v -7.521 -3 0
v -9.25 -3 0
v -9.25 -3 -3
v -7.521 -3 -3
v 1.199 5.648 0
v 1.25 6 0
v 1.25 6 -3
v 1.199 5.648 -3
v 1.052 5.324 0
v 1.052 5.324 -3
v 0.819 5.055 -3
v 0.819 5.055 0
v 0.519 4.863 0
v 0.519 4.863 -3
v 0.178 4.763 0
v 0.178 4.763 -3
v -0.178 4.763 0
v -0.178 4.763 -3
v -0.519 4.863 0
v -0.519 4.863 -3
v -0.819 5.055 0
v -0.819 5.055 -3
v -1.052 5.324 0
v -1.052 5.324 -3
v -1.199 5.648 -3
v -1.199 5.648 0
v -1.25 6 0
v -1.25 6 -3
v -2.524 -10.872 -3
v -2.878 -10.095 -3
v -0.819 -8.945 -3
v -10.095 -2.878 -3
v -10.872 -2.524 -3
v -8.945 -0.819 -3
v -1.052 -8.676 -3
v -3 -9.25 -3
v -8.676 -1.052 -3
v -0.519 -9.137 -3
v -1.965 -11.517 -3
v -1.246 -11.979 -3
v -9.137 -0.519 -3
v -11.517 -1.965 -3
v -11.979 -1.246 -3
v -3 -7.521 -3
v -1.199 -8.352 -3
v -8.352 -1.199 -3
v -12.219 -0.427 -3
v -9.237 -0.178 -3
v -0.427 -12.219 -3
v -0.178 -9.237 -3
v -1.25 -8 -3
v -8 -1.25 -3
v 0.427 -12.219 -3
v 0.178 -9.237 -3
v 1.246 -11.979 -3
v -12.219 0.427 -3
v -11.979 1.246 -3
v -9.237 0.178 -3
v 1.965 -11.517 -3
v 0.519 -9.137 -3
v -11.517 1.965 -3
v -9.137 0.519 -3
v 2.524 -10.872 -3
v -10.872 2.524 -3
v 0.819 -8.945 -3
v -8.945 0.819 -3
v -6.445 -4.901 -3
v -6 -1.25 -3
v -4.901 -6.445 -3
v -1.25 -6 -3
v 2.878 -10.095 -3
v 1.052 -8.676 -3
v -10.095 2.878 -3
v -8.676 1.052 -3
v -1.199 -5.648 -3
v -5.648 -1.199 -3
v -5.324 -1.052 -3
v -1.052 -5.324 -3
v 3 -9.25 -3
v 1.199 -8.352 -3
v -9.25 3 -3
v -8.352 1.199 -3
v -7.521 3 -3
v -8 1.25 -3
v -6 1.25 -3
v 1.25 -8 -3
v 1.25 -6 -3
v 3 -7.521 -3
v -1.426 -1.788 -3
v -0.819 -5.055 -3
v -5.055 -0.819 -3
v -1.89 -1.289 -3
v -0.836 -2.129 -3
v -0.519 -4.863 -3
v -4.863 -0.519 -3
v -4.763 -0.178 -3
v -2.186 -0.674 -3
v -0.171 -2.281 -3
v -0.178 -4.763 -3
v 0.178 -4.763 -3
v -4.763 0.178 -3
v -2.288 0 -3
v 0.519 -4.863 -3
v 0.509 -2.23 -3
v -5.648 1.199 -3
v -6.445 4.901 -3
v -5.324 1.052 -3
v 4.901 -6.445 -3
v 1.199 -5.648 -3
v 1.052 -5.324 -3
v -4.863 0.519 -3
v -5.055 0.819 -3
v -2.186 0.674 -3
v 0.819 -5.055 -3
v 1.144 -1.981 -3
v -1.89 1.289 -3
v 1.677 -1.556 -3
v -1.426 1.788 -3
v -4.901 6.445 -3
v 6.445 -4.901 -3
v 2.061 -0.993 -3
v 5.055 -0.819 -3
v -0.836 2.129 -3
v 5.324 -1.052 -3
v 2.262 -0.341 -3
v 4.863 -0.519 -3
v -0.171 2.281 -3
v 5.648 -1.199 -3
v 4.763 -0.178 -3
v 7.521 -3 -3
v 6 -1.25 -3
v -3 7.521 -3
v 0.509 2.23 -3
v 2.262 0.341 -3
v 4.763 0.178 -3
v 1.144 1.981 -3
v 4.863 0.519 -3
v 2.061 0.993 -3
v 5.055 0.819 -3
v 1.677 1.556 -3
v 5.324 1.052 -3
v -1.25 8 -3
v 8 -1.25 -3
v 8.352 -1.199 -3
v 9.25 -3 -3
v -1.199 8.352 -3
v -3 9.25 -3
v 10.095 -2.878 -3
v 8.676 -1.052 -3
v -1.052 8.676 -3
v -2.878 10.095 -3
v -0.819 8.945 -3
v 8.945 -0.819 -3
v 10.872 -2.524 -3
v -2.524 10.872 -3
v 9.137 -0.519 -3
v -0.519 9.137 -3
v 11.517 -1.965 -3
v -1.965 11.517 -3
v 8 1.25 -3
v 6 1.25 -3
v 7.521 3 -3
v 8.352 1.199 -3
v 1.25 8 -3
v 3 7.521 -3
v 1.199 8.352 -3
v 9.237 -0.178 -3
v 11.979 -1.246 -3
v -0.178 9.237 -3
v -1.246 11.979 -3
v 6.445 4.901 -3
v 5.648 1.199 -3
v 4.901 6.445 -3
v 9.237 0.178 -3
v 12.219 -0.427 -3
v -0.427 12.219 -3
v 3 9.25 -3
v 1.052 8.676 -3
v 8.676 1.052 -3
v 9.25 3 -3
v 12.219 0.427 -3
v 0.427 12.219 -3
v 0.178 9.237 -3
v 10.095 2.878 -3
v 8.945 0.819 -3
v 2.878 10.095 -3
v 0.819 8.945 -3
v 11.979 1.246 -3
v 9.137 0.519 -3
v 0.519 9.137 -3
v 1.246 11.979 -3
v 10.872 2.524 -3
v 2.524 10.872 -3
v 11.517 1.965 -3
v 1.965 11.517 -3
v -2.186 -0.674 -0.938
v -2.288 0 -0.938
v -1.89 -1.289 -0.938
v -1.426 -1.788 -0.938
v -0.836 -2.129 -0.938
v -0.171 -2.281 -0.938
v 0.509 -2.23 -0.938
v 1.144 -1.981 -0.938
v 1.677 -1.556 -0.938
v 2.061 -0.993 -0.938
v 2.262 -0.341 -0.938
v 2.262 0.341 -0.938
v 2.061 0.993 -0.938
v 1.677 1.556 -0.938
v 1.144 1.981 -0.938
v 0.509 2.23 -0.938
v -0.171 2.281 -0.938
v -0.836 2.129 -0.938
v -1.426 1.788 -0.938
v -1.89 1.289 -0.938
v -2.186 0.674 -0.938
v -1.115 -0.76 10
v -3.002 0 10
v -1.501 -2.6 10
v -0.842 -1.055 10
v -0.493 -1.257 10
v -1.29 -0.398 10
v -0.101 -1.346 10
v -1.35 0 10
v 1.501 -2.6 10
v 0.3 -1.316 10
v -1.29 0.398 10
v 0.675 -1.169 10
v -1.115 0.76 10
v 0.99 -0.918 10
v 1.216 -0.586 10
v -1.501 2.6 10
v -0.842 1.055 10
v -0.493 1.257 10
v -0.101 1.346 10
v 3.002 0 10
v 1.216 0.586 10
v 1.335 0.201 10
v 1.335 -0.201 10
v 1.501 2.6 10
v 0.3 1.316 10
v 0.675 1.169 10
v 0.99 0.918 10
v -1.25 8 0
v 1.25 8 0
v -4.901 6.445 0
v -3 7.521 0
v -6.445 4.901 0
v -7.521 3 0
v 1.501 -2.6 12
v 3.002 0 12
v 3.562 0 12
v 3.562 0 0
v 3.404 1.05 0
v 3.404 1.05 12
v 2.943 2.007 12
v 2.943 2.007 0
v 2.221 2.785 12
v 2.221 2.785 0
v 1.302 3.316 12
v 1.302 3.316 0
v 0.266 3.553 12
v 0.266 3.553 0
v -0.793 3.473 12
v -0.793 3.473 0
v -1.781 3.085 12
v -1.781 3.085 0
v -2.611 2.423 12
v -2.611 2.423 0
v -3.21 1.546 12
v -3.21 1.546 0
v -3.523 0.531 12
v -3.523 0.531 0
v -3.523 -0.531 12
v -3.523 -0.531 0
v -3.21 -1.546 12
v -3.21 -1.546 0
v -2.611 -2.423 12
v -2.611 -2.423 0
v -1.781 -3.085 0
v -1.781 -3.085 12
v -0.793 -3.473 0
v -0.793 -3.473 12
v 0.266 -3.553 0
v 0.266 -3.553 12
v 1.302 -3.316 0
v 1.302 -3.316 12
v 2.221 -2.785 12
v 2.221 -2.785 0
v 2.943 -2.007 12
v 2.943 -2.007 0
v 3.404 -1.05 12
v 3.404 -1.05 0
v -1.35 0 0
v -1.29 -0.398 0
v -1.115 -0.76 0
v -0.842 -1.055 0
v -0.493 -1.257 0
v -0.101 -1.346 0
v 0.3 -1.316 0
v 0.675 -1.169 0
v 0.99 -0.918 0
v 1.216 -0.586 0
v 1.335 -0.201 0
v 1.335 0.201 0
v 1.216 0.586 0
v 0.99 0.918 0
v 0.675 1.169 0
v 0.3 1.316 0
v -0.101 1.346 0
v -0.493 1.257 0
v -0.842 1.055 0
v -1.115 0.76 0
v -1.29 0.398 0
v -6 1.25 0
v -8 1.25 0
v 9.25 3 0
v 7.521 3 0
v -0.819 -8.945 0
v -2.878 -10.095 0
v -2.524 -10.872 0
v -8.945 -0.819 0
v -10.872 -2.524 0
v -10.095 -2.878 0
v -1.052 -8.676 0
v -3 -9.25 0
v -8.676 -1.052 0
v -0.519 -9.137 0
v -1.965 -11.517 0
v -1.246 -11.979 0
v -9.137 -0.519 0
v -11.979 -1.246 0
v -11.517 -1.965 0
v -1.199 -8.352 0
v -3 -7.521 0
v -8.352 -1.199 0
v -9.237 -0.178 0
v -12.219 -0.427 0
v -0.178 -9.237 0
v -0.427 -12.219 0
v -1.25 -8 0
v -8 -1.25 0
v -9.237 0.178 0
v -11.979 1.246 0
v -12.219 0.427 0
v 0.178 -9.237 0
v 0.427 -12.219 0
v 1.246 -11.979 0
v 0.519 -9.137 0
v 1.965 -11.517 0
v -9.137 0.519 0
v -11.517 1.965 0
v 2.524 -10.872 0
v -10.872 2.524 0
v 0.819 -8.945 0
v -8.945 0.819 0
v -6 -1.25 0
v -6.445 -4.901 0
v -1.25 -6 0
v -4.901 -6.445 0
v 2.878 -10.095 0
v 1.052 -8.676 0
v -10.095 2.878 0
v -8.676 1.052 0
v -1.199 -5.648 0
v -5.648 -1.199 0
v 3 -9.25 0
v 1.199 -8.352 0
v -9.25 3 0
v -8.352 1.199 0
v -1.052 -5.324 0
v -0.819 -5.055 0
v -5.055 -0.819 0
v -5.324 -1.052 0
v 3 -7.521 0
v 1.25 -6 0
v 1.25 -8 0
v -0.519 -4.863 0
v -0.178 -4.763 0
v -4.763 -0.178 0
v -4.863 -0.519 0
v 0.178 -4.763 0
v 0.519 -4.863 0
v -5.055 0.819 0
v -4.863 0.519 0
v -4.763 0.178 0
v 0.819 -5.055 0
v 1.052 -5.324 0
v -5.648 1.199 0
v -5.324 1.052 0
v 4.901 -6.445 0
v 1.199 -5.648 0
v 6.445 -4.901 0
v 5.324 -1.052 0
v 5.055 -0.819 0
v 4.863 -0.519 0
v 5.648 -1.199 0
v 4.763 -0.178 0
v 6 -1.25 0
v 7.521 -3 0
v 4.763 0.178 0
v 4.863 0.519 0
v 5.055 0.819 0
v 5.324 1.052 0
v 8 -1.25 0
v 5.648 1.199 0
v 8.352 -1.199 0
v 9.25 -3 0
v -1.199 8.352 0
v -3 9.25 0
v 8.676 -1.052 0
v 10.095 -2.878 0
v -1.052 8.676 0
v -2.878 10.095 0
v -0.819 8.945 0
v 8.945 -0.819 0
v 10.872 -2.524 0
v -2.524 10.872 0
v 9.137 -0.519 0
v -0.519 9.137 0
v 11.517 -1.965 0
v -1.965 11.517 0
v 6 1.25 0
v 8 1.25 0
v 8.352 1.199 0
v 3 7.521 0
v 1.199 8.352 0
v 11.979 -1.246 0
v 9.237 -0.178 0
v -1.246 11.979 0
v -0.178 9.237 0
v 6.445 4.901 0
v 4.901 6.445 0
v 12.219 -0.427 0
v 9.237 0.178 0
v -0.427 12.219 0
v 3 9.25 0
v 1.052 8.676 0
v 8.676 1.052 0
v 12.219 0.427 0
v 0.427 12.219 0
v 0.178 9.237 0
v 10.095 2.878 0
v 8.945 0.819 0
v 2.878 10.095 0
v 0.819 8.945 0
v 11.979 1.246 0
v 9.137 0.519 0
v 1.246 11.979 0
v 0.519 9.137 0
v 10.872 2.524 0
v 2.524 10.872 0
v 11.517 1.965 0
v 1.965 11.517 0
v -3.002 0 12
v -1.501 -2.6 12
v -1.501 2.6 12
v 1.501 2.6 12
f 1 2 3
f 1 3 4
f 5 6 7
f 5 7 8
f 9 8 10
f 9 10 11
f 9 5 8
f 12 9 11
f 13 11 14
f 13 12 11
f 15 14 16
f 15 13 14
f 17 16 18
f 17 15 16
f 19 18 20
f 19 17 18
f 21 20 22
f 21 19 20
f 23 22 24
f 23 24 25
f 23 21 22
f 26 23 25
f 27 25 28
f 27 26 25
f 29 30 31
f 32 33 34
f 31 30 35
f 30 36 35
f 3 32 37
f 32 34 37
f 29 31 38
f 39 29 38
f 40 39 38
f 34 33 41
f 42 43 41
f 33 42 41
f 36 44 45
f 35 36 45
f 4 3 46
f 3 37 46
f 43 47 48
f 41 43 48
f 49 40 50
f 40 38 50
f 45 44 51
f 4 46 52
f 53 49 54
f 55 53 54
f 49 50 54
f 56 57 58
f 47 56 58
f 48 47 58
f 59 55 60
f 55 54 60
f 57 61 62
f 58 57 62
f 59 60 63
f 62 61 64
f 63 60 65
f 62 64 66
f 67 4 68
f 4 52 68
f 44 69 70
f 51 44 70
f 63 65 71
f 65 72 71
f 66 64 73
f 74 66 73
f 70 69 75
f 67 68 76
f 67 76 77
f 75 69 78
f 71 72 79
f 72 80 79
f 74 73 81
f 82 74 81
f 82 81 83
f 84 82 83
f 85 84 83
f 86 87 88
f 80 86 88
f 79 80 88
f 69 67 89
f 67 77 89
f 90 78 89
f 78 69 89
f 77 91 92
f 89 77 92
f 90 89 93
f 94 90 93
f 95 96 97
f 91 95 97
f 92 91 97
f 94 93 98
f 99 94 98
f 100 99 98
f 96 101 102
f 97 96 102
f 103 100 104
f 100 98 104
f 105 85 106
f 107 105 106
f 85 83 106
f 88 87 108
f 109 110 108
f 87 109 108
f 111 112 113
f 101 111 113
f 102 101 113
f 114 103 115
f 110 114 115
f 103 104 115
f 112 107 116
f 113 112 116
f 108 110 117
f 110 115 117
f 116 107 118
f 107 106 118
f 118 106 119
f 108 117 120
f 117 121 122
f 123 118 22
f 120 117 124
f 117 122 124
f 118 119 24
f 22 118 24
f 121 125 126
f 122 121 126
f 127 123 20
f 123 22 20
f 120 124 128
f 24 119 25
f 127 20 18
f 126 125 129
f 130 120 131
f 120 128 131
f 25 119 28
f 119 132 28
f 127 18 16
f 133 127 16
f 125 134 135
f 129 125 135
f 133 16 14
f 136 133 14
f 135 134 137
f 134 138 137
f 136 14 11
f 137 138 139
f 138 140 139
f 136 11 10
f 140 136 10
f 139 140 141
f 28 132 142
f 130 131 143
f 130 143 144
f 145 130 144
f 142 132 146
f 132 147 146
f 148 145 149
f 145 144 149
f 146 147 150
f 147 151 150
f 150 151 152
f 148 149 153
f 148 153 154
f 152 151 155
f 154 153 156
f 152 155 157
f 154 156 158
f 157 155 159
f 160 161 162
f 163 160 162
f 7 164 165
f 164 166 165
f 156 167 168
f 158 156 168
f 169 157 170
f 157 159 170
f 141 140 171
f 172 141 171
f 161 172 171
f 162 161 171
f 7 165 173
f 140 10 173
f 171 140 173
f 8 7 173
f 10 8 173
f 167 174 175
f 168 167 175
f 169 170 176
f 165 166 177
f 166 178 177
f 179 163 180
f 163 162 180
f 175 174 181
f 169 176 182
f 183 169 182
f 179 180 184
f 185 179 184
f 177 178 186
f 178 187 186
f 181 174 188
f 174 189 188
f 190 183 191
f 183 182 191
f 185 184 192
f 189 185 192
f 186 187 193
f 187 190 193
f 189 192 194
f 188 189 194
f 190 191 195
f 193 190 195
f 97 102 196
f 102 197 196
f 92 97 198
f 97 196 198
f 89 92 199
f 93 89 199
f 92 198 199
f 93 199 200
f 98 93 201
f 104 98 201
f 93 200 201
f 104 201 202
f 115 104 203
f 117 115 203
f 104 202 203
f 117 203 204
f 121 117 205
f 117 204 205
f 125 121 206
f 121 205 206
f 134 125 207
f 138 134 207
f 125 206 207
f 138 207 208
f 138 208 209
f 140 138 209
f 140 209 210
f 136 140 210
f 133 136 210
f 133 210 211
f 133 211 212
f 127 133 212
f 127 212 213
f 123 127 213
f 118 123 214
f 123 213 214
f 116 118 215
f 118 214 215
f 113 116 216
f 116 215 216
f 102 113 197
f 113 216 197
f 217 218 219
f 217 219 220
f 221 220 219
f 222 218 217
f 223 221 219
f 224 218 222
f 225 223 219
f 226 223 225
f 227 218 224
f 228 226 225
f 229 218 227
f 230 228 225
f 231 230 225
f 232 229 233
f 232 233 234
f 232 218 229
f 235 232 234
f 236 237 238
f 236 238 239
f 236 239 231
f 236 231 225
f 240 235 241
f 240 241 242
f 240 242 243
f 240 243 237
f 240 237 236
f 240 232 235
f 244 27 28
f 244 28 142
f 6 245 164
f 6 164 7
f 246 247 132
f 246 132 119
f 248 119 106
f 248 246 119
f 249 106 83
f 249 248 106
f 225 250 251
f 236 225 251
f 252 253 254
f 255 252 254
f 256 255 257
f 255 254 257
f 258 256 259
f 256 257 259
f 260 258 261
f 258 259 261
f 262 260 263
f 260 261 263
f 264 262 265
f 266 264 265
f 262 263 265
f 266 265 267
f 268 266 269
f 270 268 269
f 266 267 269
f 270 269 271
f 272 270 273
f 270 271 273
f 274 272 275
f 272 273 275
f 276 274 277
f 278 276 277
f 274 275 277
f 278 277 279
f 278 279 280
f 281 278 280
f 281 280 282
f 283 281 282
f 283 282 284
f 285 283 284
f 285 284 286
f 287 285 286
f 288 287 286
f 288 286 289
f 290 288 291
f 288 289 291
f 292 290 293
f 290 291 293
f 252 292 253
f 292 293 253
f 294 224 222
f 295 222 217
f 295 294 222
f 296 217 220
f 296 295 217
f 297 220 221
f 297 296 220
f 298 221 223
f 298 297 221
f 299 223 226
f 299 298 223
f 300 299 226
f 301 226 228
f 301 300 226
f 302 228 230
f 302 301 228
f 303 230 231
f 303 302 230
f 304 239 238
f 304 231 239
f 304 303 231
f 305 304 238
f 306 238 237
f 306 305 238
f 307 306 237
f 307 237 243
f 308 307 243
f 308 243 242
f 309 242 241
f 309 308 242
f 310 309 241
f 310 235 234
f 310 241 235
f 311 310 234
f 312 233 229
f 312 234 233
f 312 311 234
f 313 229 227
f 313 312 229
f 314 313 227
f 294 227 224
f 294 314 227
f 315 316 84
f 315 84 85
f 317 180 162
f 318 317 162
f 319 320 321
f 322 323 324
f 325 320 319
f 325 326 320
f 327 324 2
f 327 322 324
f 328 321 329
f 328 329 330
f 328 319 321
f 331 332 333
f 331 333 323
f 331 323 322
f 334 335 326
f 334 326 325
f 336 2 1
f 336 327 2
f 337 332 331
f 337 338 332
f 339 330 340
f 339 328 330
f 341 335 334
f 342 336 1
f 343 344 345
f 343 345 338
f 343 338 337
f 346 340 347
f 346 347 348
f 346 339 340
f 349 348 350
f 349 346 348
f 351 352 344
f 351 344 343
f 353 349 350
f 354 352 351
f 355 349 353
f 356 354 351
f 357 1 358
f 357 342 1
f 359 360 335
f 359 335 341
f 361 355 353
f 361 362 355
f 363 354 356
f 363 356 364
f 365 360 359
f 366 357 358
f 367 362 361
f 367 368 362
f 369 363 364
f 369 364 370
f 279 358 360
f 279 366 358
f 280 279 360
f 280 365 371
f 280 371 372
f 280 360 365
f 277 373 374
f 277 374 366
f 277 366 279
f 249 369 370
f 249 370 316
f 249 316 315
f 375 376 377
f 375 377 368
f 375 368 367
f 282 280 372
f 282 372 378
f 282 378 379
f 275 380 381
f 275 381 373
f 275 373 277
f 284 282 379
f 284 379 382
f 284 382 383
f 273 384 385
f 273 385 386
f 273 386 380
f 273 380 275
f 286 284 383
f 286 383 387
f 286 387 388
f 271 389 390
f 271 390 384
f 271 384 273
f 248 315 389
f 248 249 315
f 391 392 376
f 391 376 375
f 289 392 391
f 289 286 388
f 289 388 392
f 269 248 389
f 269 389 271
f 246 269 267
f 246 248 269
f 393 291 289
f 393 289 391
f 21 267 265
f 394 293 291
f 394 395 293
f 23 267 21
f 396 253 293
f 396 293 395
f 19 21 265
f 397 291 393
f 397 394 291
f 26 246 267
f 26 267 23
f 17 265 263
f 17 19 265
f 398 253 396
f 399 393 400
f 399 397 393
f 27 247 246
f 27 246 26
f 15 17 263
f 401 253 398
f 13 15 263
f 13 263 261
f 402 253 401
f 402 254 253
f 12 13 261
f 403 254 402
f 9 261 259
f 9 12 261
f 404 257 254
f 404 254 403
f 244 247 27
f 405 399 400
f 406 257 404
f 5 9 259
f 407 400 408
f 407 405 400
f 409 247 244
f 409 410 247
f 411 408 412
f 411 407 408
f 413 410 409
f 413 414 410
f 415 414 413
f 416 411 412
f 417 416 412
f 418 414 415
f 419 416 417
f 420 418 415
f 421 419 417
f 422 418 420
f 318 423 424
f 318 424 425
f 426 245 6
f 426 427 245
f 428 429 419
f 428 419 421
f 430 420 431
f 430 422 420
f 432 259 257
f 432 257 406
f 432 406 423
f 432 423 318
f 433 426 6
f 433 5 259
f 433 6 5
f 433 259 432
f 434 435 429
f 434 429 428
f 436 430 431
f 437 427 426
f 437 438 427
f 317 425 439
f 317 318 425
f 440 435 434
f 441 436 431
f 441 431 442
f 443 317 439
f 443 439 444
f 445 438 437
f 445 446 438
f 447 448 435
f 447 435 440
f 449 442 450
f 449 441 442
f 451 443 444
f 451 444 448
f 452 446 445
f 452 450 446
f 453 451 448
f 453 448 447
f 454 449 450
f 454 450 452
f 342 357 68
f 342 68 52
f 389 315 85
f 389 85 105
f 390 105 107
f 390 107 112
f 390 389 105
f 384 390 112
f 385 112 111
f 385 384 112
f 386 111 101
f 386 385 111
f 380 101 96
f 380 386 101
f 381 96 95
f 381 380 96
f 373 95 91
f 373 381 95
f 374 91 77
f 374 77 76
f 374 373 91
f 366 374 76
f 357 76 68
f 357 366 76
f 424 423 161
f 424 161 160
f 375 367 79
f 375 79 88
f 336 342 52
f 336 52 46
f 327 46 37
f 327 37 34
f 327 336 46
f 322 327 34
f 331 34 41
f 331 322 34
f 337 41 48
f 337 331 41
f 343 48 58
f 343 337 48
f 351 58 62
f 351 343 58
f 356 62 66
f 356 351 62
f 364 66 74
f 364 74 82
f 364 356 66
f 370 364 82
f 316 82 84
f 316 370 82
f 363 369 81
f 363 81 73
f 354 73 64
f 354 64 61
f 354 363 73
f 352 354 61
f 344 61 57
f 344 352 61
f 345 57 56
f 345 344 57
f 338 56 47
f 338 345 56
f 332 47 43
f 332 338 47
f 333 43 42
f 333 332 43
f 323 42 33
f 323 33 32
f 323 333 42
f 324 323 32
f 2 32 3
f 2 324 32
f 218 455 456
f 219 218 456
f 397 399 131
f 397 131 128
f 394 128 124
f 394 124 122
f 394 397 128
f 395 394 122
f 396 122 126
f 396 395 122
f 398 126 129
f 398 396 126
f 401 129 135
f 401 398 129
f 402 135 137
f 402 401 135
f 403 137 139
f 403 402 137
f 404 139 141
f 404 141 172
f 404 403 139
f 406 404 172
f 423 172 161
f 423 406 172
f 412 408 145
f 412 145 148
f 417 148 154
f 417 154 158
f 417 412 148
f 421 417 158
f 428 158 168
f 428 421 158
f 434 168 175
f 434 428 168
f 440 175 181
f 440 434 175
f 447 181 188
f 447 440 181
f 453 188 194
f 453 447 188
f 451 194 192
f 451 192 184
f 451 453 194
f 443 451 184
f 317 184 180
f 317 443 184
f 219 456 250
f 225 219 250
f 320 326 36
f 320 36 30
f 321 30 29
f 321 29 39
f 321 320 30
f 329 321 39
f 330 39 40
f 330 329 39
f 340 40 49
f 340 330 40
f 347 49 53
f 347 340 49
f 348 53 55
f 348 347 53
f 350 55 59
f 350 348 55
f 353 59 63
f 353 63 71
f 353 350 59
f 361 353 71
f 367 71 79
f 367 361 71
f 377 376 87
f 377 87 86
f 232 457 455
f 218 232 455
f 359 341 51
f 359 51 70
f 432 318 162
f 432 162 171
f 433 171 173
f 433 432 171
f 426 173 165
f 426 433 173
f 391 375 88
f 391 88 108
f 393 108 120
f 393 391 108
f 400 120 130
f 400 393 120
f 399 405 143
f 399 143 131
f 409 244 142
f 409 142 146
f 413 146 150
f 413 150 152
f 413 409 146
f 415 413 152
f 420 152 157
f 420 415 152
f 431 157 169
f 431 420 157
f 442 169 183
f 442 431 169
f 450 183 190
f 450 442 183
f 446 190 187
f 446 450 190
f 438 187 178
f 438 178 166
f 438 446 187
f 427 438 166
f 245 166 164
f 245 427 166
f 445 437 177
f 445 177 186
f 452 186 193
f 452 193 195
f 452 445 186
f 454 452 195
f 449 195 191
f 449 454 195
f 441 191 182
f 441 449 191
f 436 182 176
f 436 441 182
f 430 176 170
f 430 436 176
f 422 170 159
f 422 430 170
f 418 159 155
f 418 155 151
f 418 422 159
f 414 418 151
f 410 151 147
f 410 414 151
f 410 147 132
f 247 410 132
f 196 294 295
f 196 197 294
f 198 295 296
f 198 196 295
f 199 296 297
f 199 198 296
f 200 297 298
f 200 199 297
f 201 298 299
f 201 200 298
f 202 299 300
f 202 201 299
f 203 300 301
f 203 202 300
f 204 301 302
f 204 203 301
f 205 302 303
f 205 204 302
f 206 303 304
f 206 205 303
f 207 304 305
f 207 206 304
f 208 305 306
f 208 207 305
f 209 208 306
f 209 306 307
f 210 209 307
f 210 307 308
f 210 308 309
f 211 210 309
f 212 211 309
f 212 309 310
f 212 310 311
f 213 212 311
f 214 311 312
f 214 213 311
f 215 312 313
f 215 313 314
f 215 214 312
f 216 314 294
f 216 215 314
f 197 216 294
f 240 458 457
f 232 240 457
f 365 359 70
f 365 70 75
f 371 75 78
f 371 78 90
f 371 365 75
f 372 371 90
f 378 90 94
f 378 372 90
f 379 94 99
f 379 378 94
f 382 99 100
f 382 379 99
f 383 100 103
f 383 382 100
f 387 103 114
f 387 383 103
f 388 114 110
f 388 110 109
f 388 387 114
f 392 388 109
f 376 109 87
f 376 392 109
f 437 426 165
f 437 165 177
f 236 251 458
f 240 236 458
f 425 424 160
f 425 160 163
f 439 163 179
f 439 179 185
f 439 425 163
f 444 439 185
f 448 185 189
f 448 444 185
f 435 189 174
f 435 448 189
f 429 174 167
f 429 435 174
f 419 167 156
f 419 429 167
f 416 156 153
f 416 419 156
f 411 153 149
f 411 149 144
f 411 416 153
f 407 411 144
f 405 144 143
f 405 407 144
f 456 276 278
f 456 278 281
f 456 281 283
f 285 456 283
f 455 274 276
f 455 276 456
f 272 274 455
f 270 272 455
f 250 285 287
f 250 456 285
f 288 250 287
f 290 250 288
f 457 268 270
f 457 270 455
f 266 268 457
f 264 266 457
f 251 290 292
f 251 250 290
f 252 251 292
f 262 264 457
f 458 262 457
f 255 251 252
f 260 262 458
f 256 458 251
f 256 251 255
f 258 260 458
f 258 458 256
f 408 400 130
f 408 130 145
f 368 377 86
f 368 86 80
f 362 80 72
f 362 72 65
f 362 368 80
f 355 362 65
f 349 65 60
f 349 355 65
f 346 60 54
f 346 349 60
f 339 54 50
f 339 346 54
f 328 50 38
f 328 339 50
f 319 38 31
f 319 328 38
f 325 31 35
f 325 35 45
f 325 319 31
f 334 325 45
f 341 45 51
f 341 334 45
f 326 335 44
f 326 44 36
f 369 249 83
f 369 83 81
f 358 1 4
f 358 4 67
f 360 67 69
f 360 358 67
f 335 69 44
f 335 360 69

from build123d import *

# Parameters (mm, degrees)
F1_R     = 3.5625
F3_DEPTH = 12
F5_DEPTH = 3
F6_W     = 2.2875
F6_H     = 3.4472514316
F8_DEPTH = 2


with BuildPart() as f3:
    # F1 (on Top) → F3 (new body)
    with BuildSketch(Plane.XY):
        Circle(F1_R)
    extrude(amount=F3_DEPTH)

    # F2 (on Top) → F5 (join)
    with BuildSketch(Plane.XY):
        with BuildLine():
            ThreePointArc((-7.5208044782, -3), (-7.809575399, -2.1384648903), (-8, -1.25))
            ThreePointArc((-8, -1.25), (-9.25, 0), (-8, 1.25))
            ThreePointArc((-8, 1.25), (-7.809575399, 2.1384648903), (-7.5208044782, 3))
            Line((-7.5208044782, 3), (-9.25, 3))
            ThreePointArc((-9.25, 3), (-12.25, 0), (-9.25, -3))
            Line((-9.25, -3), (-7.5208044782, -3))
        make_face()
        with BuildLine():
            Line((-6, -1.25), (-8, -1.25))
            ThreePointArc((-8, -1.25), (-7.809575399, -2.1384648903), (-7.5208044782, -3))
            ThreePointArc((-7.5208044782, -3), (-5.7254912453, -5.7254912453), (-3, -7.5208044782))
            ThreePointArc((-3, -7.5208044782), (-2.1384648903, -7.809575399), (-1.25, -8))
            Line((-1.25, -8), (-1.25, -6))
            ThreePointArc((-1.25, -6), (0, -4.75), (1.25, -6))
            Line((1.25, -6), (1.25, -8))
            ThreePointArc((1.25, -8), (2.1384648903, -7.809575399), (3, -7.5208044782))
            ThreePointArc((3, -7.5208044782), (5.7254912453, -5.7254912453), (7.5208044782, -3))
            ThreePointArc((7.5208044782, -3), (7.809575399, -2.1384648903), (8, -1.25))
            Line((8, -1.25), (6, -1.25))
            ThreePointArc((6, -1.25), (4.75, 0), (6, 1.25))
            Line((6, 1.25), (8, 1.25))
            ThreePointArc((8, 1.25), (7.809575399, 2.1384648903), (7.5208044782, 3))
            ThreePointArc((7.5208044782, 3), (5.7254912453, 5.7254912453), (3, 7.5208044782))
            ThreePointArc((3, 7.5208044782), (2.1384648903, 7.809575399), (1.25, 8))
            Line((1.25, 8), (1.25, 6))
            ThreePointArc((1.25, 6), (0, 4.75), (-1.25, 6))
            Line((-1.25, 6), (-1.25, 8))
            ThreePointArc((-1.25, 8), (-2.1384648903, 7.809575399), (-3, 7.5208044782))
            ThreePointArc((-3, 7.5208044782), (-5.7254912453, 5.7254912453), (-7.5208044782, 3))
            ThreePointArc((-7.5208044782, 3), (-7.809575399, 2.1384648903), (-8, 1.25))
            Line((-8, 1.25), (-6, 1.25))
            ThreePointArc((-6, 1.25), (-4.75, 0), (-6, -1.25))
        make_face()
        with BuildLine():
            ThreePointArc((-1.25, -8), (-2.1384648903, -7.809575399), (-3, -7.5208044782))
            Line((-3, -7.5208044782), (-3, -9.25))
            ThreePointArc((-3, -9.25), (0, -12.25), (3, -9.25))
            Line((3, -9.25), (3, -7.5208044782))
            ThreePointArc((3, -7.5208044782), (2.1384648903, -7.809575399), (1.25, -8))
            ThreePointArc((1.25, -8), (0, -9.25), (-1.25, -8))
        make_face()
        with BuildLine():
            Line((-3, 9.25), (-3, 7.5208044782))
            ThreePointArc((-3, 7.5208044782), (-2.1384648903, 7.809575399), (-1.25, 8))
            ThreePointArc((-1.25, 8), (0, 9.25), (1.25, 8))
            ThreePointArc((1.25, 8), (2.1384648903, 7.809575399), (3, 7.5208044782))
            Line((3, 7.5208044782), (3, 9.25))
            ThreePointArc((3, 9.25), (0, 12.25), (-3, 9.25))
        make_face()
        with BuildLine():
            ThreePointArc((8, -1.25), (7.809575399, -2.1384648903), (7.5208044782, -3))
            Line((7.5208044782, -3), (9.25, -3))
            ThreePointArc((9.25, -3), (12.25, 0), (9.25, 3))
            Line((9.25, 3), (7.5208044782, 3))
            ThreePointArc((7.5208044782, 3), (7.809575399, 2.1384648903), (8, 1.25))
            ThreePointArc((8, 1.25), (9.25, 0), (8, -1.25))
        make_face()
    extrude(amount=-F5_DEPTH)

    # F6 (on Front) → F7 (revolve, cut)
    with BuildSketch(Plane.XZ):
        Polygon((0, -0.9375), (0, 0), (-1.35, 0), (-2.2875, -0.9375), align=None)
        Polygon((-1.35, 0), (0, 0), (0, 1.35), align=None)
        Polygon((-1.35, 17.6957350954), (-1.35, 0), (0, 1.35), (0, 17.6957350954), align=None)
        with Locations((-1.14375, -2.6611257158)):
            Rectangle(F6_W, F6_H)
    revolve(axis=Axis((0, 0, 8.8478675477), (0, 0, 1)), mode=Mode.SUBTRACT)

    # F4 (on face) → F8 (cut)
    with BuildSketch(Plane.XY.offset(12)):
        Polygon((1.5011106999, 2.6), (-1.5011106999, 2.6), (-3.0022213998, 0), (-1.5011106999, -2.6), (1.5011106999, -2.6), (3.0022213998, 0), align=None)
    extrude(amount=-F8_DEPTH, mode=Mode.SUBTRACT)


solid = f3.part
